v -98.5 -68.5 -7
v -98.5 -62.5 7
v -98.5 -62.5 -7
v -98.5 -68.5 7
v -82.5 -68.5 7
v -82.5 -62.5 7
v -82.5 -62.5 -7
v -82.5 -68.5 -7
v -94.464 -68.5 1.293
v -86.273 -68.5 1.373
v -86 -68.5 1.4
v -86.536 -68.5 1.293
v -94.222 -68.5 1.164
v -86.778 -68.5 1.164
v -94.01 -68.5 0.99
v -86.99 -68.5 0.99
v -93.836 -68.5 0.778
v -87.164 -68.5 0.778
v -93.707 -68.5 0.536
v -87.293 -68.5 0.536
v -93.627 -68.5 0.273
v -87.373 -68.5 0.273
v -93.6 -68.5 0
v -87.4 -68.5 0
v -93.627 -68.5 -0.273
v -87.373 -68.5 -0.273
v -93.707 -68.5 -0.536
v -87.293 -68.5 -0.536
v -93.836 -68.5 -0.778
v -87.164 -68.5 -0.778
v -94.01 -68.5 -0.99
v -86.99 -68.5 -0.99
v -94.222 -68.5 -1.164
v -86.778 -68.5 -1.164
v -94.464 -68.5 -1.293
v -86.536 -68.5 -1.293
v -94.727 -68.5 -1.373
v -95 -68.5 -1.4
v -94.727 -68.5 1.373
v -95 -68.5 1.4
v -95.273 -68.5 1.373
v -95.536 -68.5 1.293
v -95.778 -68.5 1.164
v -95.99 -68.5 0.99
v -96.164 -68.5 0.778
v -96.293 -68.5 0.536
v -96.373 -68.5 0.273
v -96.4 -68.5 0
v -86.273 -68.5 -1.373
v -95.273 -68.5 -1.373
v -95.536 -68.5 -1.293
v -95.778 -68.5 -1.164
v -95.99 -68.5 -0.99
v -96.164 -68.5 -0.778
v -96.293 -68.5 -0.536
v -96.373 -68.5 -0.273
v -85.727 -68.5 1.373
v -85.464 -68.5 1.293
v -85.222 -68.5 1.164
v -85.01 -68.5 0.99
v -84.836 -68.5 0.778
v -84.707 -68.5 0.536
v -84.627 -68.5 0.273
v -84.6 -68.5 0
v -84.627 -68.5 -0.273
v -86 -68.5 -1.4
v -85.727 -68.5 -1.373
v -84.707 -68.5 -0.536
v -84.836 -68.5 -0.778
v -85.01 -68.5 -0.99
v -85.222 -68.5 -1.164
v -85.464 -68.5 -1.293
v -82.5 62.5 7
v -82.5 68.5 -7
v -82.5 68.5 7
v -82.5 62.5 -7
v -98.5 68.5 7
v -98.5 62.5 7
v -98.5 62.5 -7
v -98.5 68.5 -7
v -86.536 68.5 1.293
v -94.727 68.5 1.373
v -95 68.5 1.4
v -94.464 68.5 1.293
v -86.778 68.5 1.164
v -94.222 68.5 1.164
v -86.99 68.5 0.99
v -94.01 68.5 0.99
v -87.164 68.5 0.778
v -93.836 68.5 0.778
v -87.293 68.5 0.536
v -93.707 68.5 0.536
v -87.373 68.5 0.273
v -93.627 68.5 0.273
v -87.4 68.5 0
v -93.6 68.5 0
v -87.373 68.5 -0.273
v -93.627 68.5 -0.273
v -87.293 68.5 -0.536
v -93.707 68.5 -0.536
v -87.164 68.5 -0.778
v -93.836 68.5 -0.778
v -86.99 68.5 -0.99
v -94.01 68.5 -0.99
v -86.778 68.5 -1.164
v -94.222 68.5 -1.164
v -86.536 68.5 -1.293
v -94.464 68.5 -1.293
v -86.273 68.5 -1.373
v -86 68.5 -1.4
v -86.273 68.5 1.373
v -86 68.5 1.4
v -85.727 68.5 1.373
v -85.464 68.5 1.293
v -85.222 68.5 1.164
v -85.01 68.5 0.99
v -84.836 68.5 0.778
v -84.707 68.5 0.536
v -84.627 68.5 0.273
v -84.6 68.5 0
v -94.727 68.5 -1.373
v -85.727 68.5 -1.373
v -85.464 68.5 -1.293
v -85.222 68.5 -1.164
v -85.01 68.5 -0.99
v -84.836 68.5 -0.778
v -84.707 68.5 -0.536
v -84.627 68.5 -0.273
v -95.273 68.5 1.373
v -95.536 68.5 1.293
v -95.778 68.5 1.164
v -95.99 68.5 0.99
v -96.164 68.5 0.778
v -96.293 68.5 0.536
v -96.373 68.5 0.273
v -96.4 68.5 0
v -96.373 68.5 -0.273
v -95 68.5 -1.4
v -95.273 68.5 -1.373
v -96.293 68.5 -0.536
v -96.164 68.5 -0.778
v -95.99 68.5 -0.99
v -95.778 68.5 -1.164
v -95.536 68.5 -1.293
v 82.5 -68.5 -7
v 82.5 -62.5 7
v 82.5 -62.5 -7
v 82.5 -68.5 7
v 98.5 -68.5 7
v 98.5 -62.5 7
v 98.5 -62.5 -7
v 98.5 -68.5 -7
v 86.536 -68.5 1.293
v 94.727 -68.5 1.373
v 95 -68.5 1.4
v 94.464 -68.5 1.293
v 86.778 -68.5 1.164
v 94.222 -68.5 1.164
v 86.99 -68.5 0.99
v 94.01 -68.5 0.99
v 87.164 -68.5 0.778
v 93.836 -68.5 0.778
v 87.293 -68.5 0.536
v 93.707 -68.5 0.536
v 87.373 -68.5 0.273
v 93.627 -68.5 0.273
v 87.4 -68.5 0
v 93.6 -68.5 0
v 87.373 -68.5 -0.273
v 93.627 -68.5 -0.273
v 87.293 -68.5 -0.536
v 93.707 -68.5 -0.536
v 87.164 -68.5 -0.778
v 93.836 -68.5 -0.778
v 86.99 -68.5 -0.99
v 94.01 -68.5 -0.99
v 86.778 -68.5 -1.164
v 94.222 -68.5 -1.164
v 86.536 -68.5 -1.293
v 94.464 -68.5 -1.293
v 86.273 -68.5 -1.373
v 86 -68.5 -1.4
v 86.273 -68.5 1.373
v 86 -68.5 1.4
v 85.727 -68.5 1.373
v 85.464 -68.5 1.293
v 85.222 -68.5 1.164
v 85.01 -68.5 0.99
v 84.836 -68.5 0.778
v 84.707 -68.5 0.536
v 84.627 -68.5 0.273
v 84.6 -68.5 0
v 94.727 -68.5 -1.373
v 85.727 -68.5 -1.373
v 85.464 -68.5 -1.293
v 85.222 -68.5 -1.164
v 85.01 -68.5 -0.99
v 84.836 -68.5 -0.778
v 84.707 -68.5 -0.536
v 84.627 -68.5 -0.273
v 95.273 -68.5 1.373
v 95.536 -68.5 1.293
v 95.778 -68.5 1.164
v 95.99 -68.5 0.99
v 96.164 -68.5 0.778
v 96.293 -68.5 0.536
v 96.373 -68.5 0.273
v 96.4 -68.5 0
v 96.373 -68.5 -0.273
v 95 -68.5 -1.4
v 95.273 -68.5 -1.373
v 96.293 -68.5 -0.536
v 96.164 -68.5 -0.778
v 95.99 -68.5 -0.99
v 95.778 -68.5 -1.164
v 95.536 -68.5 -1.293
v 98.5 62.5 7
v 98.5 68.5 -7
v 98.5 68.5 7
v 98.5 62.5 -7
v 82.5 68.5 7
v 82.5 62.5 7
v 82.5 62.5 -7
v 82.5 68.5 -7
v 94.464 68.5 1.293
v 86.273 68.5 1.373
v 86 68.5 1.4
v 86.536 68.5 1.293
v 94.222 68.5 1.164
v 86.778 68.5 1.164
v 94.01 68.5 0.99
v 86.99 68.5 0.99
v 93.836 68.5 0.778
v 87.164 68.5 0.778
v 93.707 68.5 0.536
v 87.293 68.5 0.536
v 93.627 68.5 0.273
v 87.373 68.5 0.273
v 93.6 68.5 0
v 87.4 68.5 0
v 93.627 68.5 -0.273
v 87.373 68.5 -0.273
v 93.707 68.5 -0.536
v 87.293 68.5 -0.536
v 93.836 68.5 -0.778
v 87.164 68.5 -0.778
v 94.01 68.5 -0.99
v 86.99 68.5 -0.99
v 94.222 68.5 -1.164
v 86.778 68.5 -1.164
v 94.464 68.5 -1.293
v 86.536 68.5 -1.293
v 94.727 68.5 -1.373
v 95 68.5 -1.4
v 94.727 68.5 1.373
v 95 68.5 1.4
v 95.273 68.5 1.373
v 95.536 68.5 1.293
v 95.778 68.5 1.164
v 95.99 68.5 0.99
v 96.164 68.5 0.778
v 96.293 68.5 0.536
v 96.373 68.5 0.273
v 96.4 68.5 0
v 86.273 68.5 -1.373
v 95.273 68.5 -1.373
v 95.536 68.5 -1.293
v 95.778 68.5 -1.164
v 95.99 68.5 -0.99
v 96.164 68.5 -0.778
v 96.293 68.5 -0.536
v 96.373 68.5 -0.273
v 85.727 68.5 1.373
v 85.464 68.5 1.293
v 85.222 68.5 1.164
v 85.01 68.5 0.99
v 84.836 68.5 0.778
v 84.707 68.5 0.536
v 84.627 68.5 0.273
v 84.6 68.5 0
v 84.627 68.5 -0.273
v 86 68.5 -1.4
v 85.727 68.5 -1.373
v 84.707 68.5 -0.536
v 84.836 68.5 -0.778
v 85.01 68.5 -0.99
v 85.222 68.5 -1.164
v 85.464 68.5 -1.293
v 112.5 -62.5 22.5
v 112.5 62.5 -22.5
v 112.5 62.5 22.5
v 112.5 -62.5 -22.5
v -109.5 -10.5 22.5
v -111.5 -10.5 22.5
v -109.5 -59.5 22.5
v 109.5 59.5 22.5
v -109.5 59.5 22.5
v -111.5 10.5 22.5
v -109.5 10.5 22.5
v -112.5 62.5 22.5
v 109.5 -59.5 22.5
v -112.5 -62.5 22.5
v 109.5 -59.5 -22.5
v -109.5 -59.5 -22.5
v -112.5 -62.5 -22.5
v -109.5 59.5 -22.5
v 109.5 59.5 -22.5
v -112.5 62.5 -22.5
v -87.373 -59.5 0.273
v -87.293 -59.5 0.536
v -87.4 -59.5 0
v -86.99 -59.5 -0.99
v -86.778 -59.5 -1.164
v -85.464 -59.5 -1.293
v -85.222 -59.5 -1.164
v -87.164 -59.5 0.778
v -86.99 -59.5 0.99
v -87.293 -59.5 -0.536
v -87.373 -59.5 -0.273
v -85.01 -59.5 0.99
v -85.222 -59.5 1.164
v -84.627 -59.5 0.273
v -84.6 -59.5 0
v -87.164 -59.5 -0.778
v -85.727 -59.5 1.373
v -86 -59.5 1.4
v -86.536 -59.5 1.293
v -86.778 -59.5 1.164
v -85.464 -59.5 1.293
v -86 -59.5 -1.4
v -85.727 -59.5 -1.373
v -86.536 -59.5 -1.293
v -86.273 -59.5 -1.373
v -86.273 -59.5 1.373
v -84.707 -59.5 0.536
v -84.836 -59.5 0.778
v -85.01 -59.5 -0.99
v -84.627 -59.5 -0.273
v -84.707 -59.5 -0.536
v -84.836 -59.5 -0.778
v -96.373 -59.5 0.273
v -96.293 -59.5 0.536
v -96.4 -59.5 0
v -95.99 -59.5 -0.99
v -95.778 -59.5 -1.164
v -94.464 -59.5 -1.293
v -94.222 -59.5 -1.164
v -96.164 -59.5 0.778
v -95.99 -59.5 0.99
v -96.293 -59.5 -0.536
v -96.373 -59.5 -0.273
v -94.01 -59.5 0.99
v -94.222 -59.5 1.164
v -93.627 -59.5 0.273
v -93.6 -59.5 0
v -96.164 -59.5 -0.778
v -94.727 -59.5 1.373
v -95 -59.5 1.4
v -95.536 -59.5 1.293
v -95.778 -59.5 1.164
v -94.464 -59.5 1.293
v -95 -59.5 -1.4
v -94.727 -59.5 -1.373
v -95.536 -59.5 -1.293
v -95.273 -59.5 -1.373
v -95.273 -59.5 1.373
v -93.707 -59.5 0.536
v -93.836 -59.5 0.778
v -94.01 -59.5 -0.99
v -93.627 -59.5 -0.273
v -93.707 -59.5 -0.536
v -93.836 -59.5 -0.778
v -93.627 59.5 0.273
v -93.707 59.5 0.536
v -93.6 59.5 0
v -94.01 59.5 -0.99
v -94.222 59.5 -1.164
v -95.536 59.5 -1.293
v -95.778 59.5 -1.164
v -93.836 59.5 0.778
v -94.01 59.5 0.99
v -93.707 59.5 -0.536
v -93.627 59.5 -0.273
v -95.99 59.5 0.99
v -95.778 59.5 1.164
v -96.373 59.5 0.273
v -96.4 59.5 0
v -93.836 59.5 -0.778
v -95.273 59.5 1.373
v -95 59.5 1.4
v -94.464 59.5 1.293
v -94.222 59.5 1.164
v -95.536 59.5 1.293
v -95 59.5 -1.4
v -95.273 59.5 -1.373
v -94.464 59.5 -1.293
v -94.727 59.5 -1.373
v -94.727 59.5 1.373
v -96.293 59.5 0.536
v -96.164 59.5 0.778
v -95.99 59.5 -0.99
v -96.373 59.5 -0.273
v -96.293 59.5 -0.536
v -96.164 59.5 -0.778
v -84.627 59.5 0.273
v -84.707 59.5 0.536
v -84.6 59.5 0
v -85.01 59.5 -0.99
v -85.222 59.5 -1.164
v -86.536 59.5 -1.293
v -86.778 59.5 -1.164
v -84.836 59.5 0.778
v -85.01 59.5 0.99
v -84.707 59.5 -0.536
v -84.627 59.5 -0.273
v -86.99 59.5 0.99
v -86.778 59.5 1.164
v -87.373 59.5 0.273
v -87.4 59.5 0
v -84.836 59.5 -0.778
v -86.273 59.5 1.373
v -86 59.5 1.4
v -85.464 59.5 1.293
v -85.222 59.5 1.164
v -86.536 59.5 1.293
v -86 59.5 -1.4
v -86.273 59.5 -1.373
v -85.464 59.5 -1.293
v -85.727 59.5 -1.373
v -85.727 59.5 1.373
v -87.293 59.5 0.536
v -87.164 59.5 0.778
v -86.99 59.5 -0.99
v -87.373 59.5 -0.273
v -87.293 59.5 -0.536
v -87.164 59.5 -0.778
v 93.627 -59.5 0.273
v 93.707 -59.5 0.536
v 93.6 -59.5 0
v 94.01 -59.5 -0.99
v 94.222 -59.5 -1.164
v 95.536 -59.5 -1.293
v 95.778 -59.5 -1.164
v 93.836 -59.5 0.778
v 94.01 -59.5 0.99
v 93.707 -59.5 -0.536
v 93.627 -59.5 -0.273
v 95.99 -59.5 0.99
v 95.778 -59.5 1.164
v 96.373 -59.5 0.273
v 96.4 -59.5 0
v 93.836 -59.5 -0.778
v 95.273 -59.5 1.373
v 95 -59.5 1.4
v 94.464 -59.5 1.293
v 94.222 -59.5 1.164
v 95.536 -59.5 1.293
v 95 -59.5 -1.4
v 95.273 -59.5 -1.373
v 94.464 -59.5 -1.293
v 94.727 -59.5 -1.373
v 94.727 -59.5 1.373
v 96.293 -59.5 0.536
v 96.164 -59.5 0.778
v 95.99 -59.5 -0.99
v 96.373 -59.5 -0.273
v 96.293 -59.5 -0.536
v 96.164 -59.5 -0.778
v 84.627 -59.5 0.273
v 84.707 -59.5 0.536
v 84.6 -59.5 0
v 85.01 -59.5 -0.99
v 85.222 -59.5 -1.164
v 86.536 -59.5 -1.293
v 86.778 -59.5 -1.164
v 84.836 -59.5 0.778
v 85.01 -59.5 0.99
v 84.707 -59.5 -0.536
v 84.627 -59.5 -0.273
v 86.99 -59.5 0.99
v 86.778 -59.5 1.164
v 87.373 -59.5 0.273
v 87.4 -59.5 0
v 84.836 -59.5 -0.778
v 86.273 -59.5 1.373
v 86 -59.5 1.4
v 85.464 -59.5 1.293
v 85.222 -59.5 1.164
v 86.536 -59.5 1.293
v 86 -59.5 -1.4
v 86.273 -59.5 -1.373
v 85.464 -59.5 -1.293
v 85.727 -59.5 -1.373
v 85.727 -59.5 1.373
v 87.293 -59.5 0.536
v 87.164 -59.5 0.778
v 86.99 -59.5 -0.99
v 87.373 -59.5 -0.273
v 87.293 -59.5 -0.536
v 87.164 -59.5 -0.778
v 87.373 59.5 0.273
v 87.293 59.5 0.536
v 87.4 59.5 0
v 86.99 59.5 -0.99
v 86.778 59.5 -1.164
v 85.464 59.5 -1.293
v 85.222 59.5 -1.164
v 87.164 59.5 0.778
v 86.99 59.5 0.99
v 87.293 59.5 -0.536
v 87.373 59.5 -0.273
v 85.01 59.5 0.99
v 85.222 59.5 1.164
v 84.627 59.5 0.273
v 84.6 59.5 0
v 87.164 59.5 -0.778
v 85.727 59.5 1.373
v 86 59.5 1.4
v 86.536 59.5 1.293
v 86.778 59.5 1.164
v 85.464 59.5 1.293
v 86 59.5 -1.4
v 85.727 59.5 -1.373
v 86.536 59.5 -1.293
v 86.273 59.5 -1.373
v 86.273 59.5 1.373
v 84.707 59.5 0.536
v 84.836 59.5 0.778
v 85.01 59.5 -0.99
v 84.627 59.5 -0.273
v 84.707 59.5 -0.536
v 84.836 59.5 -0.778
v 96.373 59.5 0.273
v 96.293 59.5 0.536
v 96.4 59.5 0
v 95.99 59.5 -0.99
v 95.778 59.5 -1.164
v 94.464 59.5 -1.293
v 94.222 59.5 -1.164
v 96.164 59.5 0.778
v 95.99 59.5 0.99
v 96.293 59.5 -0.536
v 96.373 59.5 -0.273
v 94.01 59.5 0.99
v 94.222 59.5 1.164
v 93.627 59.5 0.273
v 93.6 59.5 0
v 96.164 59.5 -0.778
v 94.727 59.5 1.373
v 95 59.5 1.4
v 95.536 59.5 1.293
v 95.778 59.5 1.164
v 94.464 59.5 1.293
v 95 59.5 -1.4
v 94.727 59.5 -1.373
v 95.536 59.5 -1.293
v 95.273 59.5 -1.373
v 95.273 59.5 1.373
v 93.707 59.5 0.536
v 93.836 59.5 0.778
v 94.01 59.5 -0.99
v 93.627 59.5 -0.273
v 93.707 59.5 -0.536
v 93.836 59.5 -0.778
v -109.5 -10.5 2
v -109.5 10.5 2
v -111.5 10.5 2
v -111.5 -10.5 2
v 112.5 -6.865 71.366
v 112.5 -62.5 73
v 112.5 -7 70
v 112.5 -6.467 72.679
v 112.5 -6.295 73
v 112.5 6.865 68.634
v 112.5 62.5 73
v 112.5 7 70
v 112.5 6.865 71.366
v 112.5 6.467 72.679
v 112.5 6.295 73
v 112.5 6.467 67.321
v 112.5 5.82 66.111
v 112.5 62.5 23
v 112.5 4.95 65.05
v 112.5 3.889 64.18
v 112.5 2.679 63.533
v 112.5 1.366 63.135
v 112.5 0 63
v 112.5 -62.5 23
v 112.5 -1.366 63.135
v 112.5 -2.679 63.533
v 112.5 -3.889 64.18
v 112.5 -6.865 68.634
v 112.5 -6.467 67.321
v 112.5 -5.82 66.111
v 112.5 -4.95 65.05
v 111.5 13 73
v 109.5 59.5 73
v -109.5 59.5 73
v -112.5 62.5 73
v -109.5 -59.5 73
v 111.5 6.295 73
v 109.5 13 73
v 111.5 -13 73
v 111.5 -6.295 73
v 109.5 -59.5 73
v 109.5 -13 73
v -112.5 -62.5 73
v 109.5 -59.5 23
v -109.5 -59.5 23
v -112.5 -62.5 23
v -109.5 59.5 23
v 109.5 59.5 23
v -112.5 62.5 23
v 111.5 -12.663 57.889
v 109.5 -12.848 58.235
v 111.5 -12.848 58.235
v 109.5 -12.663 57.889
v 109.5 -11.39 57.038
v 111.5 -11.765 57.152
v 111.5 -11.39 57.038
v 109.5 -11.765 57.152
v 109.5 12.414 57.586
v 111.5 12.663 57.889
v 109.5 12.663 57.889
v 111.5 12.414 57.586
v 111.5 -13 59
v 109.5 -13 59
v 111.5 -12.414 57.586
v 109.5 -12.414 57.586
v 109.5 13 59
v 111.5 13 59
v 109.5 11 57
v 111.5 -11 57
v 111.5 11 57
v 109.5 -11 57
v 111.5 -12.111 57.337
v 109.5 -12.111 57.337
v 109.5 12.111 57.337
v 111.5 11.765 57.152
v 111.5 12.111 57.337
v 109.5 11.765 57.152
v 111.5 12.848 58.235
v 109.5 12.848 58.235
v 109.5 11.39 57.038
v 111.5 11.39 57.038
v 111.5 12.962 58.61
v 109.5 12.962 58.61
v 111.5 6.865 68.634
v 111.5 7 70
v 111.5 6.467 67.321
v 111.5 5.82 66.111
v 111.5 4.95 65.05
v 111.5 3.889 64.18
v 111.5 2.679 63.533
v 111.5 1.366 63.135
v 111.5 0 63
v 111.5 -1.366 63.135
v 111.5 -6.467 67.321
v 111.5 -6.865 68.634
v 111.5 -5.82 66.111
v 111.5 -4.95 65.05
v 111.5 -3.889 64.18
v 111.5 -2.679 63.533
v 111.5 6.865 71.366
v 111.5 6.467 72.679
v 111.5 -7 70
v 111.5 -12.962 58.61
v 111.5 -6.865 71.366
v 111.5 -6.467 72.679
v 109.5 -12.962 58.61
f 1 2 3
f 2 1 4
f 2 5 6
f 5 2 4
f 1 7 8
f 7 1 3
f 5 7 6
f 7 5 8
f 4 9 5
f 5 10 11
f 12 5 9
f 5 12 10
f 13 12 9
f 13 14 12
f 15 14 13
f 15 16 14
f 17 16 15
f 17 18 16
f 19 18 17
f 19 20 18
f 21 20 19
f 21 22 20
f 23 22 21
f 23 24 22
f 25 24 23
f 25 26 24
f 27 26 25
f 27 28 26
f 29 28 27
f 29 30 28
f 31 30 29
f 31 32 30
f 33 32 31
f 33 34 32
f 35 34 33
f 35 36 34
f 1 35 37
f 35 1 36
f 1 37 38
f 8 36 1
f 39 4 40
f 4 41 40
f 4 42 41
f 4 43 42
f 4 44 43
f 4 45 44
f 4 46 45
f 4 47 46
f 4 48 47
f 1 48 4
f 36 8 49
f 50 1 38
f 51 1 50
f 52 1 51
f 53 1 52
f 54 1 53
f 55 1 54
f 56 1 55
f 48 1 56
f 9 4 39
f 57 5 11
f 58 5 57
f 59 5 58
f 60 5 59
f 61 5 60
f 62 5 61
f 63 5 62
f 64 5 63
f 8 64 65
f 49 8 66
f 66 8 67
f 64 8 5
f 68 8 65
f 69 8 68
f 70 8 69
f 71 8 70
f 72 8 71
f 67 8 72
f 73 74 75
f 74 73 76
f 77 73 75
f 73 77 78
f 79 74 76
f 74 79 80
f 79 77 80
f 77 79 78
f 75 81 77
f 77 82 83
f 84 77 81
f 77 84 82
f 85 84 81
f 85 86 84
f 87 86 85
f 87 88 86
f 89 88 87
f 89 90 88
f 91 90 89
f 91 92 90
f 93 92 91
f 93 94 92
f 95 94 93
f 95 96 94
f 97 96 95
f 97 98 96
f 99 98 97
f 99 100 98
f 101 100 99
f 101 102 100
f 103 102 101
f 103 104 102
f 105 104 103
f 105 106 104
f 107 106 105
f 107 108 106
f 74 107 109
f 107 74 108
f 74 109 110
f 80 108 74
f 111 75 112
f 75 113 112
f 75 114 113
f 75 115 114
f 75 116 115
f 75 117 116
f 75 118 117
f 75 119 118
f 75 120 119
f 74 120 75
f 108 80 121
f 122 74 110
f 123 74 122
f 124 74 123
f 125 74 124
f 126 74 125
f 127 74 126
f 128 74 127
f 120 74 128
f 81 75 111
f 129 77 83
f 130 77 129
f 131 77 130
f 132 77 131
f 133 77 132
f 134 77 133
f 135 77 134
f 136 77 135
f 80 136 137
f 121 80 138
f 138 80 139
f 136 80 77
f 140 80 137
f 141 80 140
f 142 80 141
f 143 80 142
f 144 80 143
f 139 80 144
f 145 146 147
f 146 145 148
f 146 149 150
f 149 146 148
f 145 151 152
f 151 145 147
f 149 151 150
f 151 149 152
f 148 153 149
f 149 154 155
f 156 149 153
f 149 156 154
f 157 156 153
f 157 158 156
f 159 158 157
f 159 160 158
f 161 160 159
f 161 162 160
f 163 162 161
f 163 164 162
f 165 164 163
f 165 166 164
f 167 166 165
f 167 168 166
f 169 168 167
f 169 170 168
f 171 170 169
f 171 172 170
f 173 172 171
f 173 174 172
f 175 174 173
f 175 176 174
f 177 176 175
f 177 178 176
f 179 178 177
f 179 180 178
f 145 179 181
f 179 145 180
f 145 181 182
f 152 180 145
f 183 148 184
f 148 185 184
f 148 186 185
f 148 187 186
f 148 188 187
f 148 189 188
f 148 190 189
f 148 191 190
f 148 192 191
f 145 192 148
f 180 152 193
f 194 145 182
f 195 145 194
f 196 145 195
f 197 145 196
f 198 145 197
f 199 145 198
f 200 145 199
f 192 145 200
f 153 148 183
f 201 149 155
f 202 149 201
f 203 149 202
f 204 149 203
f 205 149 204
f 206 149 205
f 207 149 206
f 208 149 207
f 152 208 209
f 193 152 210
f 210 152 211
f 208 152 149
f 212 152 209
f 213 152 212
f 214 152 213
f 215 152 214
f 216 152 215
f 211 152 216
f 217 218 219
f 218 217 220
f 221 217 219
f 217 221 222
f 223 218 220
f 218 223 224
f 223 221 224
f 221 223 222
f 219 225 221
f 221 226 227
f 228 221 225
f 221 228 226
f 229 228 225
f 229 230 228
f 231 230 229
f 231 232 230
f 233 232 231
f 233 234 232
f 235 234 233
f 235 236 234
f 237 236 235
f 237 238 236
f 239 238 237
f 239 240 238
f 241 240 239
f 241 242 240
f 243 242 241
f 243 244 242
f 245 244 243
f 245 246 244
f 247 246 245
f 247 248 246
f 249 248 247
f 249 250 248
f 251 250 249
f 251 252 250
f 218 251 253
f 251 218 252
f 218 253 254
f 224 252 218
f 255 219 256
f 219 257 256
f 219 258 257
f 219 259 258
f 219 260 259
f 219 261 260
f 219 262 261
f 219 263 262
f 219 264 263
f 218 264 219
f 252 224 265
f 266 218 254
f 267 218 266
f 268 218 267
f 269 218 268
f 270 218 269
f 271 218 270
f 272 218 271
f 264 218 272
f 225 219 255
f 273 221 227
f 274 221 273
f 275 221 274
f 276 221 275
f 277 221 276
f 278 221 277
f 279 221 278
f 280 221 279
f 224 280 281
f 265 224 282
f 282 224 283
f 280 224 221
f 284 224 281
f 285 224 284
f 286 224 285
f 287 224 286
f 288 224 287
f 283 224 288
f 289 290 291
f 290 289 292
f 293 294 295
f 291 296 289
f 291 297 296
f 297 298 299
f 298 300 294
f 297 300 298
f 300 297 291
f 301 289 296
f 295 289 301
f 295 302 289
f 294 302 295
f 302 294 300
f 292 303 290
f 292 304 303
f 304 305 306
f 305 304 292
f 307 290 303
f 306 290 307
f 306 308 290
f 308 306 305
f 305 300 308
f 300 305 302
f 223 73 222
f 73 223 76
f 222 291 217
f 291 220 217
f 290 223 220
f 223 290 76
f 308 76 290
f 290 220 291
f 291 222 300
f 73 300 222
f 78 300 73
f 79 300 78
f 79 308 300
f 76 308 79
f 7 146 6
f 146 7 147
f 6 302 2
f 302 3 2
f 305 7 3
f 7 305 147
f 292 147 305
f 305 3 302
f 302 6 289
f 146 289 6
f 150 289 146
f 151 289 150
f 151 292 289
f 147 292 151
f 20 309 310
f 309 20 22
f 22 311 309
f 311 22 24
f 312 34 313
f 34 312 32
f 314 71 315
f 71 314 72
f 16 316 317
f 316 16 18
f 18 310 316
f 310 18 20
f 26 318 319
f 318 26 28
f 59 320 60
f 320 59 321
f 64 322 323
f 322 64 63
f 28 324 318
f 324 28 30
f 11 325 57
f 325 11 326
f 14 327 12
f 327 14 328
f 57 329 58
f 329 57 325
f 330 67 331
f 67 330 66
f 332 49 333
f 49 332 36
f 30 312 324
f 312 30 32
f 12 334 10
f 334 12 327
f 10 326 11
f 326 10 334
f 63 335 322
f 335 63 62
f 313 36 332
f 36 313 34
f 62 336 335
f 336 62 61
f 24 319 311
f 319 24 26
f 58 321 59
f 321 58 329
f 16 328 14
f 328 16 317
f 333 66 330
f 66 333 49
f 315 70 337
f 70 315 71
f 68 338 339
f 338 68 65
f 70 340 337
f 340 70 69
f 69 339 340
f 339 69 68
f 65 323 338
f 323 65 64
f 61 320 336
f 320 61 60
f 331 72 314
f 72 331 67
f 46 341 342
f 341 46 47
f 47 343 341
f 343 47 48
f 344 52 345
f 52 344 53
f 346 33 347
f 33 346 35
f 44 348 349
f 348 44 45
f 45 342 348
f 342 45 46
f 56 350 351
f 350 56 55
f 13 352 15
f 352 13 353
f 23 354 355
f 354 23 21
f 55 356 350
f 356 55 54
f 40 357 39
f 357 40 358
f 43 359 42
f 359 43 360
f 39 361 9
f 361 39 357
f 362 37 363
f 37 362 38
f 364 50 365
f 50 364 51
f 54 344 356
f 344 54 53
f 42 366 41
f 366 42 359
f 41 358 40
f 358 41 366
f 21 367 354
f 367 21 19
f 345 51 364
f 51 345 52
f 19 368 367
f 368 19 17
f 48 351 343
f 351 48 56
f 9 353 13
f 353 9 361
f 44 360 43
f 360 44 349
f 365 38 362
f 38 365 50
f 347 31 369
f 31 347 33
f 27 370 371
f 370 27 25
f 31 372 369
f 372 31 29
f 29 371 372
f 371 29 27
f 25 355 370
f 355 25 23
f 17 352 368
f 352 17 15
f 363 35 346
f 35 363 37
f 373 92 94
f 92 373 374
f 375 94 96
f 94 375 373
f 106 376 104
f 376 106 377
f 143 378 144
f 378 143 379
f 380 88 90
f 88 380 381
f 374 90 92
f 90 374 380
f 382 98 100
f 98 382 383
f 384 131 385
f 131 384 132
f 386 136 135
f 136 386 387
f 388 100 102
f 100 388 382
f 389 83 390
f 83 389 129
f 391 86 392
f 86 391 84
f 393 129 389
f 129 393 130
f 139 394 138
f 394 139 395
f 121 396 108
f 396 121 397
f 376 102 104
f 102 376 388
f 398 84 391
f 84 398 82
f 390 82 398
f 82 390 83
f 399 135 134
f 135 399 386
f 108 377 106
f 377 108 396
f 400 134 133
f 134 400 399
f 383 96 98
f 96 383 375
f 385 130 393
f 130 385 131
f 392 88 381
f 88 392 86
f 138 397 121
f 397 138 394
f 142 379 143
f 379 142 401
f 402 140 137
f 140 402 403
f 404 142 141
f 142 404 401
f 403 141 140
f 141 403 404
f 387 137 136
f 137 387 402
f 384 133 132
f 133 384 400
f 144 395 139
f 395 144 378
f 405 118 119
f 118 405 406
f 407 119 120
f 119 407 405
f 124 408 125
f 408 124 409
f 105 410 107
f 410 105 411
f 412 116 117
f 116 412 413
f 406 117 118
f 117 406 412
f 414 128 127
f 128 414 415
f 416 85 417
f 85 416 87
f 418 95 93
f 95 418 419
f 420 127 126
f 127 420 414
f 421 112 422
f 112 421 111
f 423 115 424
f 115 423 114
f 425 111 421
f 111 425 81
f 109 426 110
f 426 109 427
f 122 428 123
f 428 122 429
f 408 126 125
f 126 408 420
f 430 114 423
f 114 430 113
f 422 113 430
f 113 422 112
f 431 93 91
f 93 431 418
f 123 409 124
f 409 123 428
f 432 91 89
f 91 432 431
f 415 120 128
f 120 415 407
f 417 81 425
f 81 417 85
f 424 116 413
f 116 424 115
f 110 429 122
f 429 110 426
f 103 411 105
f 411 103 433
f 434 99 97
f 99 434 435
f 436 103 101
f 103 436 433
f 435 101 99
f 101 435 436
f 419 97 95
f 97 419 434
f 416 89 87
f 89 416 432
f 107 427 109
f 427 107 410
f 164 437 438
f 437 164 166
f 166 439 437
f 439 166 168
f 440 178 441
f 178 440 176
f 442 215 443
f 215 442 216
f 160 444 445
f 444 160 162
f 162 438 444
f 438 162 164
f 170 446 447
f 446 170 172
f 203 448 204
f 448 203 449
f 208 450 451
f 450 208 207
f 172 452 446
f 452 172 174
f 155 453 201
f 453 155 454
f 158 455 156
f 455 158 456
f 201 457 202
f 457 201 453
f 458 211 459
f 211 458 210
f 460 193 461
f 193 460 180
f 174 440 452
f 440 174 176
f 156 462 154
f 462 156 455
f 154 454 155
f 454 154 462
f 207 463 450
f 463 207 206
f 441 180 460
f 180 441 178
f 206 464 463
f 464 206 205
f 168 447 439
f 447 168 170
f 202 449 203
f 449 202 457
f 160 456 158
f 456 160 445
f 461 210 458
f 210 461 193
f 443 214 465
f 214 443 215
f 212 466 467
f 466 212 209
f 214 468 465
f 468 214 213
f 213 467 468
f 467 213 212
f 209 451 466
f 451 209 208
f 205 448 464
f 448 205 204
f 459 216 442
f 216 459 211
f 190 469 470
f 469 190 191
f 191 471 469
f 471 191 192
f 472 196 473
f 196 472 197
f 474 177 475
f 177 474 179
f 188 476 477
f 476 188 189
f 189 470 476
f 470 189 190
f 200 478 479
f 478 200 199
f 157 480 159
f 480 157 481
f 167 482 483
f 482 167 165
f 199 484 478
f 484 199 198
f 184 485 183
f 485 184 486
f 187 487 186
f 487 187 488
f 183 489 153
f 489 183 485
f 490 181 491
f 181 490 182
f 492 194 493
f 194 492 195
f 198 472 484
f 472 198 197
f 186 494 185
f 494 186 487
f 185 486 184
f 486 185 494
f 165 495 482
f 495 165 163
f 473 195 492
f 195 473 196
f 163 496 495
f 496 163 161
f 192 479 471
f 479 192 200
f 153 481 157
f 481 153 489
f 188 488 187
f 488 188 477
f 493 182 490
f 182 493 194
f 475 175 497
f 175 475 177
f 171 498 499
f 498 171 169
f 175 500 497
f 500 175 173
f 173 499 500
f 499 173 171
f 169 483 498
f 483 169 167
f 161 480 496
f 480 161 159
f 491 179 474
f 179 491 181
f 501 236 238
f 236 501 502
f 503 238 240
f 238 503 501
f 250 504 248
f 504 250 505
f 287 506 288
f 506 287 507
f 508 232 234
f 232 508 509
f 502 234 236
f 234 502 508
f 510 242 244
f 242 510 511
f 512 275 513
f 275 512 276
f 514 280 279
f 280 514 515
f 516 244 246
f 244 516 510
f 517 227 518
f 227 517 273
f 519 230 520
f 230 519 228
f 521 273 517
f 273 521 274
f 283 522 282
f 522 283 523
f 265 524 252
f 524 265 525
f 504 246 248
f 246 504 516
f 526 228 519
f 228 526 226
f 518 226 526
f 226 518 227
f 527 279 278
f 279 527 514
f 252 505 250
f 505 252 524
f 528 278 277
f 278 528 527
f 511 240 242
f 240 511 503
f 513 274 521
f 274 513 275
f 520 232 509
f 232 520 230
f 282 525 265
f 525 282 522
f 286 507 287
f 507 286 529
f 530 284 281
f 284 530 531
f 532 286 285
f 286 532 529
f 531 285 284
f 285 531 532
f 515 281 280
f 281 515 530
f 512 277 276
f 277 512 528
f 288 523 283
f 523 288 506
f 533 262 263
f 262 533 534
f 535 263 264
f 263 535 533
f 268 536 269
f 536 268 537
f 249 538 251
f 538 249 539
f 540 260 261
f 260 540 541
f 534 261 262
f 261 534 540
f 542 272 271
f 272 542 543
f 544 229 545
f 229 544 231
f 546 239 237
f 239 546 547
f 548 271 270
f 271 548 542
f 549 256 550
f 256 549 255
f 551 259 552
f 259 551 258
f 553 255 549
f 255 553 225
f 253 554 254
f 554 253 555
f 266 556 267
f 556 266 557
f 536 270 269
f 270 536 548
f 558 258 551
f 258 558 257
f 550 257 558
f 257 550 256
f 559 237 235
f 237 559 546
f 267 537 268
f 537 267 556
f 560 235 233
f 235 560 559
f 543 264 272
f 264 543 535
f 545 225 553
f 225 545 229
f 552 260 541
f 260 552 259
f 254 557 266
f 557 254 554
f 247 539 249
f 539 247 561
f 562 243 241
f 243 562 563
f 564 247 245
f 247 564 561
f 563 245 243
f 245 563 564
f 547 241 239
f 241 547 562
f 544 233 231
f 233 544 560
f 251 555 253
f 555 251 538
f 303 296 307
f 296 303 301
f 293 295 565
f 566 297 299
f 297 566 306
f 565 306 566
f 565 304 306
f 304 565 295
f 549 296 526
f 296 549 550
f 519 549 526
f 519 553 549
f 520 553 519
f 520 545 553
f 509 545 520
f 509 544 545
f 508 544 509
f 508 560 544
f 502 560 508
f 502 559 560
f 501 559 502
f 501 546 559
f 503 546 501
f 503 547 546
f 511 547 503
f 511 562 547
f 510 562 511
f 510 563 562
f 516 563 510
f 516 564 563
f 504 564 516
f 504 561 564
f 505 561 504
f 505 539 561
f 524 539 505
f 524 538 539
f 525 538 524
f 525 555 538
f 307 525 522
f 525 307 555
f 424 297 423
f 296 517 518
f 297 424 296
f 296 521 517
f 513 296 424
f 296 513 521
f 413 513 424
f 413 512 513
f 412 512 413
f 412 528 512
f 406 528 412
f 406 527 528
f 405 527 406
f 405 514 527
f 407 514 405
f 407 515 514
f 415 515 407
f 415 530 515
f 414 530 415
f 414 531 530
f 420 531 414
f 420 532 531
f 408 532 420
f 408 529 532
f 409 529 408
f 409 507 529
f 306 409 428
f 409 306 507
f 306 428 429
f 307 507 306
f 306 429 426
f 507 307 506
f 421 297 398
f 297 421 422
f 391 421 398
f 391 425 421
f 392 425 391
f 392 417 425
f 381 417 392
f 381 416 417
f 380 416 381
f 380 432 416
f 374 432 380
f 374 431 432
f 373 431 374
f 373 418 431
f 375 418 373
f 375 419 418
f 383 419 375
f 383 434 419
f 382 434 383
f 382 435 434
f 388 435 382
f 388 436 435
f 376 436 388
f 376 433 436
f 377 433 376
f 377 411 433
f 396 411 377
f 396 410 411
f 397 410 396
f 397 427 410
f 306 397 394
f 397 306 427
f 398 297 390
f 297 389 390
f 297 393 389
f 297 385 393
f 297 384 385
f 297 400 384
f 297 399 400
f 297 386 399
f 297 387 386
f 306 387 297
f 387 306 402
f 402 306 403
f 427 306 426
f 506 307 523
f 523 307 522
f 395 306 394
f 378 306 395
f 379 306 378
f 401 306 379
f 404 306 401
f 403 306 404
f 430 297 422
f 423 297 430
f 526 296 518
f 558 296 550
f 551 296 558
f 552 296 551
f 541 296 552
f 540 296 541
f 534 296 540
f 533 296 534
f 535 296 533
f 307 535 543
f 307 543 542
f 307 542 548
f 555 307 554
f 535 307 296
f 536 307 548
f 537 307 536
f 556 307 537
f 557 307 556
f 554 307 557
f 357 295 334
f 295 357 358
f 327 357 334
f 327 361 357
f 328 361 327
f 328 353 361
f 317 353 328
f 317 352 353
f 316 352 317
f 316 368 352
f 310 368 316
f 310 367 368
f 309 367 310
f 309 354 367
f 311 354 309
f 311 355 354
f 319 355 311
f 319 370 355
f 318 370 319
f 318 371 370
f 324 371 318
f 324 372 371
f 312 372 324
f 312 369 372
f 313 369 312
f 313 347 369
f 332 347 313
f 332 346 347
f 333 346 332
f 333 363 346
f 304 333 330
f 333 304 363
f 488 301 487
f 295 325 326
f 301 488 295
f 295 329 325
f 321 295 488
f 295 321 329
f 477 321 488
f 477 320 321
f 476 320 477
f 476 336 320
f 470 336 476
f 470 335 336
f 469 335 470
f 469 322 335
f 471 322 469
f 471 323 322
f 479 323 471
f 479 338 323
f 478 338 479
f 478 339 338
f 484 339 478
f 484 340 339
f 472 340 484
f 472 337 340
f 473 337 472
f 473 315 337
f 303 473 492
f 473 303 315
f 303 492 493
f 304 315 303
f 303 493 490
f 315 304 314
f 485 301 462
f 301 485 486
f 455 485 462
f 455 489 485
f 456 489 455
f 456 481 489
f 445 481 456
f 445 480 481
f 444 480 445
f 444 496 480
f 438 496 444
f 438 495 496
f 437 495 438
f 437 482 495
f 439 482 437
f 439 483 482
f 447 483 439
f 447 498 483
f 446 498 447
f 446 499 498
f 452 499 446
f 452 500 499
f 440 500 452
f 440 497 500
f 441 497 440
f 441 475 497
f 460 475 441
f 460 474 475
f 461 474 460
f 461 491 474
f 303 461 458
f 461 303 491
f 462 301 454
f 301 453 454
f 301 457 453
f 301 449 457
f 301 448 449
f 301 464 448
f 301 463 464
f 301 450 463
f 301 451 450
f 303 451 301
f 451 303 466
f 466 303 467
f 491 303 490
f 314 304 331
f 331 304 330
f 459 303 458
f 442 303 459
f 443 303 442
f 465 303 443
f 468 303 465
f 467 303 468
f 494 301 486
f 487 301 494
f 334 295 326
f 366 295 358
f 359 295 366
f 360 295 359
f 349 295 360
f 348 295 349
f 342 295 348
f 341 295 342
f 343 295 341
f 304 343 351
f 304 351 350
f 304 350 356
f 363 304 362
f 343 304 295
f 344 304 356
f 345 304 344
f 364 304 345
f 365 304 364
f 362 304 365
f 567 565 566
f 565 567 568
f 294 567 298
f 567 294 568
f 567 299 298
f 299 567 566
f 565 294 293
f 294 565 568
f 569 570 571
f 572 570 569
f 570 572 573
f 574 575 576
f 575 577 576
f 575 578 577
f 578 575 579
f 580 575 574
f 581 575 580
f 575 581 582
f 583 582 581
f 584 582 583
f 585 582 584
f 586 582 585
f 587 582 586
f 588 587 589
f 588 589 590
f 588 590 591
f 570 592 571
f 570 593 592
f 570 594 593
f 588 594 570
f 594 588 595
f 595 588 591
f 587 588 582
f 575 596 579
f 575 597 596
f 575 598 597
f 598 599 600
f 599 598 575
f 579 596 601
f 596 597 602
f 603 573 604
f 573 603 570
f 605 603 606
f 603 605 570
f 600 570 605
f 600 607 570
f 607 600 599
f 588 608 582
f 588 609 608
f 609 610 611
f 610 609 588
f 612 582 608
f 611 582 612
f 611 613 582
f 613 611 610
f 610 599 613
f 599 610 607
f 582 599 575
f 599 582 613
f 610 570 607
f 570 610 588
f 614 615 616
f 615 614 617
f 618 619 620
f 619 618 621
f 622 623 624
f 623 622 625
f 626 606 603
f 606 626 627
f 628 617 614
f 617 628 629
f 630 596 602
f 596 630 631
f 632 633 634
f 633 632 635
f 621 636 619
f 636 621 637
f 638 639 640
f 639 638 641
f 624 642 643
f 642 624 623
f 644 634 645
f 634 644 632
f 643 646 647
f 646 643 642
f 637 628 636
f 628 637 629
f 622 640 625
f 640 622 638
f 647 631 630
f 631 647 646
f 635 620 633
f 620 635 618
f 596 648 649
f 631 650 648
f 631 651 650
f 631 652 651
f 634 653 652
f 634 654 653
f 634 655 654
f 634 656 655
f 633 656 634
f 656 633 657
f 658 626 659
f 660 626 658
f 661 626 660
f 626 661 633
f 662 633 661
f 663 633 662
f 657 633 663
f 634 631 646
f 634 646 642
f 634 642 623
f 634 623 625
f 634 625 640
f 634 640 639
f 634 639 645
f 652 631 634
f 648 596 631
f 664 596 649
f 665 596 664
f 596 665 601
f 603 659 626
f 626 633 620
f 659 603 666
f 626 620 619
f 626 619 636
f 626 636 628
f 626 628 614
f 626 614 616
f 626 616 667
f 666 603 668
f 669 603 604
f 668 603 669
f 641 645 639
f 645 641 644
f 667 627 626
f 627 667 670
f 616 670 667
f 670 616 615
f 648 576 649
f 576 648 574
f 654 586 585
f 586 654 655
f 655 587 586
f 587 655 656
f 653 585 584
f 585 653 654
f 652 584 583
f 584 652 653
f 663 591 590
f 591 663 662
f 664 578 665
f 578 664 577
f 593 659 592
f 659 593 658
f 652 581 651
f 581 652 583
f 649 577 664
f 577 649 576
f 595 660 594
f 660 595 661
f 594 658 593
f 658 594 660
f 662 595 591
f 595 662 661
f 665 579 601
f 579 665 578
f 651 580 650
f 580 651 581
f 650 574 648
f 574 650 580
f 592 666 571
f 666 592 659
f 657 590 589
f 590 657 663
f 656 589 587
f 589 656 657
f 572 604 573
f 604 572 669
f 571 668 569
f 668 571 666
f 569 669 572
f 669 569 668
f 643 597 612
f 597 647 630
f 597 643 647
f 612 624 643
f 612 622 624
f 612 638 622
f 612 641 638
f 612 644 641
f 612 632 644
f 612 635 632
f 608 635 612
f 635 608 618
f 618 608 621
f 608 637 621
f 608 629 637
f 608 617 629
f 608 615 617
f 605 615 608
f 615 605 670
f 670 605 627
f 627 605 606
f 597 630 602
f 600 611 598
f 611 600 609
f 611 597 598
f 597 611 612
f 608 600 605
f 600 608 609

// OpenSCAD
// file: body_v4_addons.scad
//=============================================================================
// body_v4_addons.scad —— 车身 v4 的"可插入模块"
//
// ★ 用法：**不要重写 body_v3.scad** ✗
//   把本文件的内容拷到 body_v3.scad 末尾，然后在需要的地方调用下面这些
//   module —— 加在 difference() 外面（实体）或里面（开孔）都行。
//
//   设计原则沿用你们 v3 的：
//     · 优先"形状互锁"，不用弹性变形（卡扣会断）
//     · 竖直生长的细小特征不许承力
//     · 大面朝下打印
//
// 坐标约定（和 body_v3 一致）：
//   x = 前后（+x 向前）, y = 左右, z = 高度（0 = 下层底面）
//   内腔：x ∈ [-(L/2-WALL), +(L/2-WALL)]，y ∈ [-(W/2-WALL), +(W/2-WALL)]
//=============================================================================

// ---------------- 车身参数（和 body_v3 对齐）----------------
WALL  = 3;
FLOOR = 3;
L     = 225;      // 缩小后
W     = 125;
H1    = 45;
H2    = 50;
IN_X  = L/2 - WALL;
IN_Y  = W/2 - WALL;

BOARD_T = 1.6;    // 板厚（FPGA / K230 都约 1.6）
M3_TAP  = 2.8;    // M3 自攻底孔
$fn = 32;

//=============================================================================
// 1) L 形边夹 —— 夹住板边（不依赖安装孔）
//
//   立于底板上，顶部有个向内的"爪"，板从侧面滑进去被压住。
//   hook=true 时爪更长（滑入式）；false 时是纯挡边。
//
//   用法：在底板上放 4 个，两两相对，夹住板的两条对边。
//=============================================================================
module board_clamp(t = BOARD_T, h = 7, reach = 4, th = 2.5, hook = true) {
    gap = 0.3;                       // 板与爪的间隙（宁松勿紧）
    union() {
        // 竖柱（立在底板上，z 从 0 开始）
        cube([th, th, h + t + gap]);
        // 顶部爪：从柱子向 -y 方向伸，压住板的上表面
        translate([0, -reach, h + gap])
            cube([th, th + reach, t]);
        if (hook) {
            // 滑入斜角（导向，板一推就进去）
            translate([0, -reach, h + gap])
                rotate([0, 45, 0])
                    cube([th, th + reach, th]);
        }
    }
}

//=============================================================================
// 2) 扎带孔对 —— 2 个腰形孔 + 中间留桥
//
//   任何模块都能用扎带绑住（后买的降压模块尺寸未知也能装 ✓）
//   从底板穿透（z 方向），跨度 span，孔径 w。
//=============================================================================
module zip_slots(span = 16, w = 3, l = 6, z0 = 0, h = FLOOR) {
    for (sx = [-1, 1])
        translate([sx*span/2 - l/2, -w/2, z0 - 0.01])
            cube([l, w, h + 0.02]);
}

// 扎带孔阵列（底板上一排，间距 pitch）
module zip_grid(nx = 5, ny = 3, pitch = 20, span = 16, z0 = 0) {
    for (ix = [0 : nx-1])
        for (iy = [0 : ny-1])
            translate([(ix - (nx-1)/2) * pitch, (iy - (ny-1)/2) * pitch, 0])
                zip_slots(span = span, z0 = z0);
}

//=============================================================================
// 3) 卡槽/兜 —— 3 面挡边 + 一面开口（模块从开口滑进去）
//
//   用于：电池、充电宝、降压模块（尺寸不确定的都能卡）
//   内腔 = W × D，壁厚 th，高 h
//=============================================================================
module cradle(Wi = 40, Di = 20, h = 12, th = 2, open_dir = "y+") {
    // 底板
    cube([Wi + 2*th, Di + 2*th, th]);
    // 三面墙（按 open_dir 省一面）
    if (open_dir != "x-") translate([-th, 0, 0]) cube([th, Di + 2*th, h]);
    if (open_dir != "x+") translate([Wi, 0, 0])  cube([th, Di + 2*th, h]);
    if (open_dir != "y-") translate([0, -th, 0]) cube([Wi + 2*th, th, h]);
    if (open_dir != "y+") translate([0, Di, 0])  cube([Wi + 2*th, th, h]);
}

//=============================================================================
// 4) 方形沉台 —— 摄像头（方形模块，掉不出来）
//
//   从【内表面】往墙里挖 depth 深、size × size 的方形坑，四角 R2。
//   中间再开一个圆通孔让镜头看出去（light_d）。
//   用法（放在 difference() 里）：
//     translate([x, y, z_wall_inner]) square_pocket(26, 2, 14);
//=============================================================================
module square_pocket(size = 26, depth = 2, light_d = 14) {
    r = 2;
    translate([0, 0, -0.01])
        hull() {
            for (sx = [-1, 1], sy = [-1, 1])
                translate([sx*(size/2 - r), sy*(size/2 - r), 0])
                    cylinder(r = r, h = depth + 0.01);
        }
    // 让镜头看出去的通孔（穿墙）
    translate([0, 0, -depth - 50])
        cylinder(d = light_d, h = 200);
}

//=============================================================================
// 5) 矩形沉台 —— 超声波 HC-SR04（孔尺寸不变，只加台阶防脱）
//=============================================================================
module rect_pocket(px = 46, py = 21, depth = 2) {
    translate([-px/2, -py/2, -0.01])
        cube([px, py, depth + 0.01]);
}

//=============================================================================
// 6) 挡件安装座 —— 侧壁外侧加厚 + 2 个自攻底孔
//
//   舵机是"穿墙式"，腿在【墙外】→ 挡件必须装在墙外 ✗
//   所以在侧壁外面加一块 16×14×6 的凸台，再开 2 个 φ2.8 底孔。
//
//   用法（实体，加在 difference() 外面）：
//     translate([x, ±(W/2), z]) stop_boss();
//   孔（放在 difference() 里）用 stop_boss_holes()
//=============================================================================
module stop_boss(w = 16, d = 6, h = 14) {
    // 贴墙的那个面在 y=0，往外（+y）长 d
    translate([-w/2, 0, -h/2])
        cube([w, d, h]);
    // 根部过渡（避免 90° 应力集中）
    translate([-w/2, -1.5, -h/2])
        cube([w, 1.5, h]);
}

module stop_boss_holes(w = 16, d = 6, pitch = 9) {
    // 2 个水平孔，从外侧打进墙
    for (sx = [-1, 1])
        translate([sx*pitch/2, d + 0.01, 0])
            rotate([90, 0, 0])
                cylinder(d = M3_TAP, h = d + WALL + 3);
}

//=============================================================================
// 7) 可调卡槽 —— 底板浅槽 + 2 个滑动 L 夹块
//
//   后买的降压模块尺寸未知？先用浅槽定位，再用 2 个夹块（M3 锁）夹住
//=============================================================================
module slot_channel(len = 120, wid = 8, dep = 1.5) {
    translate([-len/2, -wid/2, -0.01])
        cube([len, wid, dep + 0.01]);
}

module slider_clamp(h = 12, th = 3, tab = 5) {
    difference() {
        union() {
            cube([th, tab, h]);                       // 竖块
            translate([0, 0, h - tab])
                cube([th, tab * 2.2, tab]);           // 顶部压爪
        }
        // M3 长孔（锁紧用）
        translate([th/2, tab/2, h * 0.45])
            rotate([90, 0, 0])
                cylinder(d = 3.4, h = tab * 2 + 2, center = true);
    }
}

//=============================================================================
// 8) 演示：把上面几个拼一下，F5 看效果（交付时删掉或 SHOW_DEMO=false）
//=============================================================================
SHOW_DEMO = true;

if (SHOW_DEMO) {
    // 一块 120×80 的假底板
    difference() {
        translate([-60, -40, -FLOOR]) cube([120, 80, FLOOR]);
        // 扎带孔阵列
        translate([0, 0, -FLOOR]) zip_grid(nx = 4, ny = 2, pitch = 30, span = 16);
        // 摄像头方形沉台（挖在右下角）
        translate([45, -30, -0.01]) square_pocket(26, 2, 14);
        // 超声波矩形沉台（挖在左下角）
        translate([-45, -30, -0.01]) rect_pocket(46, 21, 2);
        // 挡件底孔
        translate([-55, 35, -FLOOR]) stop_boss_holes();
    }
    // 4 个 L 边夹（夹一块 100×60 的假板）
    for (sx = [-1, 1], sy = [-1, 1])
        translate([sx*50, sy*30, -FLOOR + 0])
            rotate([0, 0, (sy > 0) ? 0 : 180])
                board_clamp();
    // 电池兜
    translate([-45, 5, 0]) cradle(88, 61, 12, 2, "y+");
    // 降压模块卡槽
    translate([40, 20, 0]) slot_channel(120, 8, 1.5);
    translate([10, 20, 0]) slider_clamp();
    translate([30, 20, 0]) rotate([0, 0, 180]) slider_clamp();
}
// main file
//=============================================================================
// body_v4_skeleton.scad —— 统一建模 + 分开建模的"正确结构"演示
//
// ★ 这个文件的重点不是形状，是【结构】：
//     一个 PART 参数同时支持三种输出：
//       "assembly" → 两层叠起来看（检查干涉）
//       "lower"    → 只出下层（打印用，落在 z=0 平面）
//       "upper"    → 只出上层（打印用，落在 z=0 平面）
//
// ★ 关键规则（踩过的坑）：
//   1. addons 必须写在【各层的 module 内部】，不能写在顶层
//      —— 否则 "upper" 导出时会带着下层的夹爪 ✗
//   2. 每层单独导出时，必须**自己从 z=0 开始长** ✓
//   3. 每层导出后检查 **Simple: yes** ✓
//   4. 墙上的沉台要 rotate 一下（我的 pocket 默认沿 -z 挖）
//=============================================================================

include <body_v4_addons.scad>      // 7 个可插入模块

// ---------------- 输出选择 ----------------
PART = "assembly";   // "assembly" | "lower" | "upper"
SHOW_DEMO = false;

// ---------------- 尺寸 ----------------
// （和 v3 对齐，缩小后）
// L=225 W=125 H1=45 H2=50 WALL=3 FLOOR=3  已在 addons 里定义

//=============================================================================
// 下层（打印时 z 从 0 开始）
//   放：电池、电机驱动板、5.5V 降压、端子排、超声波（前壁）
//=============================================================================
module lower_body() {
    difference() {
        union() {
            // ---- 盒子本体（你队友 v3 里已有，这里只画个示意）----
            cube([L, W, H1], center = true);          // 外壳（示意）
            // ---- 挡件安装座 ×4（装在侧壁外面）----
            for (sx = [-1, 1])
                for (sz = [-1, 1])
                    translate([sx*(L/2 - 22), sz*(W/2), 0])
                        rotate([0, 0, sz > 0 ? 0 : 180])
                            stop_boss(16, 6, 14);
        }
        // ---- 掏空内腔（示意）----
        translate([0, 0, FLOOR])
            cube([L - 2*WALL, W - 2*WALL, H1 + 10], center = true);
        translate([0, 0, FLOOR/2])
            cube([L - 2*WALL, W - 2*WALL, FLOOR + 0.01], center = true);

        // ---- 超声波矩形沉台（前壁，从内表面往墙里挖）----
        translate([-(L/2 - WALL), 0, 25])
            rotate([0, -90, 0]) rect_pocket(46, 21, 2);

        // ---- 扎带孔阵列（底板）----
        translate([0, 0, 0]) zip_grid(4, 2, 30, 16);

        // ---- 挡件底孔 ×4 ----
        for (sx = [-1, 1])
            for (sz = [-1, 1])
                translate([sx*(L/2 - 22), sz*(W/2), 0])
                    rotate([0, 0, sz > 0 ? 0 : 180])
                        stop_boss_holes(16, 6, 9);
    }
}

//=============================================================================
// 上层（打印时同样 z 从 0 开始）
//   放：FPGA、K230、充电宝不放这（绑后壁外面）、9V 降压
//=============================================================================
module upper_body() {
    difference() {
        union() {
            cube([L, W, H2], center = true);          // 外壳（示意）
            // ---- FPGA 四角 L 边夹 ----
            for (sx = [-1, 1])
                for (sy = [-1, 1])
                    translate([-34 + sx*50, sy*30, FLOOR])
                        rotate([0, 0, sy > 0 ? 0 : 180])
                            board_clamp();
        }
        // ---- 掏空 ----
        translate([0, 0, FLOOR])
            cube([L - 2*WALL, W - 2*WALL, H2 + 10], center = true);
        translate([0, 0, FLOOR/2])
            cube([L - 2*WALL, W - 2*WALL, FLOOR + 0.01], center = true);

        // ---- 摄像头方形沉台（前壁，要 rotate 让挖的方向朝墙里）----
        translate([L/2 - WALL, 0, 22])
            rotate([0, 90, 0]) square_pocket(26, 2, 14);

        // ---- 扎带孔阵列 ----
        zip_grid(4, 2, 30, 16);
    }
}

//=============================================================================
// 统一装配（检查干涉用）
//=============================================================================
module assembly() {
    color([0.85, 0.88, 0.95]) lower_body();
    translate([0, 0, H1 + FLOOR])
        color([0.95, 0.90, 0.82]) upper_body();
}

//=============================================================================
// 输出选择
//=============================================================================
if (PART == "assembly")      assembly();
else if (PART == "lower")    lower_body();
else if (PART == "upper")    upper_body();
else echo("PART 只能是 assembly / lower / upper");
